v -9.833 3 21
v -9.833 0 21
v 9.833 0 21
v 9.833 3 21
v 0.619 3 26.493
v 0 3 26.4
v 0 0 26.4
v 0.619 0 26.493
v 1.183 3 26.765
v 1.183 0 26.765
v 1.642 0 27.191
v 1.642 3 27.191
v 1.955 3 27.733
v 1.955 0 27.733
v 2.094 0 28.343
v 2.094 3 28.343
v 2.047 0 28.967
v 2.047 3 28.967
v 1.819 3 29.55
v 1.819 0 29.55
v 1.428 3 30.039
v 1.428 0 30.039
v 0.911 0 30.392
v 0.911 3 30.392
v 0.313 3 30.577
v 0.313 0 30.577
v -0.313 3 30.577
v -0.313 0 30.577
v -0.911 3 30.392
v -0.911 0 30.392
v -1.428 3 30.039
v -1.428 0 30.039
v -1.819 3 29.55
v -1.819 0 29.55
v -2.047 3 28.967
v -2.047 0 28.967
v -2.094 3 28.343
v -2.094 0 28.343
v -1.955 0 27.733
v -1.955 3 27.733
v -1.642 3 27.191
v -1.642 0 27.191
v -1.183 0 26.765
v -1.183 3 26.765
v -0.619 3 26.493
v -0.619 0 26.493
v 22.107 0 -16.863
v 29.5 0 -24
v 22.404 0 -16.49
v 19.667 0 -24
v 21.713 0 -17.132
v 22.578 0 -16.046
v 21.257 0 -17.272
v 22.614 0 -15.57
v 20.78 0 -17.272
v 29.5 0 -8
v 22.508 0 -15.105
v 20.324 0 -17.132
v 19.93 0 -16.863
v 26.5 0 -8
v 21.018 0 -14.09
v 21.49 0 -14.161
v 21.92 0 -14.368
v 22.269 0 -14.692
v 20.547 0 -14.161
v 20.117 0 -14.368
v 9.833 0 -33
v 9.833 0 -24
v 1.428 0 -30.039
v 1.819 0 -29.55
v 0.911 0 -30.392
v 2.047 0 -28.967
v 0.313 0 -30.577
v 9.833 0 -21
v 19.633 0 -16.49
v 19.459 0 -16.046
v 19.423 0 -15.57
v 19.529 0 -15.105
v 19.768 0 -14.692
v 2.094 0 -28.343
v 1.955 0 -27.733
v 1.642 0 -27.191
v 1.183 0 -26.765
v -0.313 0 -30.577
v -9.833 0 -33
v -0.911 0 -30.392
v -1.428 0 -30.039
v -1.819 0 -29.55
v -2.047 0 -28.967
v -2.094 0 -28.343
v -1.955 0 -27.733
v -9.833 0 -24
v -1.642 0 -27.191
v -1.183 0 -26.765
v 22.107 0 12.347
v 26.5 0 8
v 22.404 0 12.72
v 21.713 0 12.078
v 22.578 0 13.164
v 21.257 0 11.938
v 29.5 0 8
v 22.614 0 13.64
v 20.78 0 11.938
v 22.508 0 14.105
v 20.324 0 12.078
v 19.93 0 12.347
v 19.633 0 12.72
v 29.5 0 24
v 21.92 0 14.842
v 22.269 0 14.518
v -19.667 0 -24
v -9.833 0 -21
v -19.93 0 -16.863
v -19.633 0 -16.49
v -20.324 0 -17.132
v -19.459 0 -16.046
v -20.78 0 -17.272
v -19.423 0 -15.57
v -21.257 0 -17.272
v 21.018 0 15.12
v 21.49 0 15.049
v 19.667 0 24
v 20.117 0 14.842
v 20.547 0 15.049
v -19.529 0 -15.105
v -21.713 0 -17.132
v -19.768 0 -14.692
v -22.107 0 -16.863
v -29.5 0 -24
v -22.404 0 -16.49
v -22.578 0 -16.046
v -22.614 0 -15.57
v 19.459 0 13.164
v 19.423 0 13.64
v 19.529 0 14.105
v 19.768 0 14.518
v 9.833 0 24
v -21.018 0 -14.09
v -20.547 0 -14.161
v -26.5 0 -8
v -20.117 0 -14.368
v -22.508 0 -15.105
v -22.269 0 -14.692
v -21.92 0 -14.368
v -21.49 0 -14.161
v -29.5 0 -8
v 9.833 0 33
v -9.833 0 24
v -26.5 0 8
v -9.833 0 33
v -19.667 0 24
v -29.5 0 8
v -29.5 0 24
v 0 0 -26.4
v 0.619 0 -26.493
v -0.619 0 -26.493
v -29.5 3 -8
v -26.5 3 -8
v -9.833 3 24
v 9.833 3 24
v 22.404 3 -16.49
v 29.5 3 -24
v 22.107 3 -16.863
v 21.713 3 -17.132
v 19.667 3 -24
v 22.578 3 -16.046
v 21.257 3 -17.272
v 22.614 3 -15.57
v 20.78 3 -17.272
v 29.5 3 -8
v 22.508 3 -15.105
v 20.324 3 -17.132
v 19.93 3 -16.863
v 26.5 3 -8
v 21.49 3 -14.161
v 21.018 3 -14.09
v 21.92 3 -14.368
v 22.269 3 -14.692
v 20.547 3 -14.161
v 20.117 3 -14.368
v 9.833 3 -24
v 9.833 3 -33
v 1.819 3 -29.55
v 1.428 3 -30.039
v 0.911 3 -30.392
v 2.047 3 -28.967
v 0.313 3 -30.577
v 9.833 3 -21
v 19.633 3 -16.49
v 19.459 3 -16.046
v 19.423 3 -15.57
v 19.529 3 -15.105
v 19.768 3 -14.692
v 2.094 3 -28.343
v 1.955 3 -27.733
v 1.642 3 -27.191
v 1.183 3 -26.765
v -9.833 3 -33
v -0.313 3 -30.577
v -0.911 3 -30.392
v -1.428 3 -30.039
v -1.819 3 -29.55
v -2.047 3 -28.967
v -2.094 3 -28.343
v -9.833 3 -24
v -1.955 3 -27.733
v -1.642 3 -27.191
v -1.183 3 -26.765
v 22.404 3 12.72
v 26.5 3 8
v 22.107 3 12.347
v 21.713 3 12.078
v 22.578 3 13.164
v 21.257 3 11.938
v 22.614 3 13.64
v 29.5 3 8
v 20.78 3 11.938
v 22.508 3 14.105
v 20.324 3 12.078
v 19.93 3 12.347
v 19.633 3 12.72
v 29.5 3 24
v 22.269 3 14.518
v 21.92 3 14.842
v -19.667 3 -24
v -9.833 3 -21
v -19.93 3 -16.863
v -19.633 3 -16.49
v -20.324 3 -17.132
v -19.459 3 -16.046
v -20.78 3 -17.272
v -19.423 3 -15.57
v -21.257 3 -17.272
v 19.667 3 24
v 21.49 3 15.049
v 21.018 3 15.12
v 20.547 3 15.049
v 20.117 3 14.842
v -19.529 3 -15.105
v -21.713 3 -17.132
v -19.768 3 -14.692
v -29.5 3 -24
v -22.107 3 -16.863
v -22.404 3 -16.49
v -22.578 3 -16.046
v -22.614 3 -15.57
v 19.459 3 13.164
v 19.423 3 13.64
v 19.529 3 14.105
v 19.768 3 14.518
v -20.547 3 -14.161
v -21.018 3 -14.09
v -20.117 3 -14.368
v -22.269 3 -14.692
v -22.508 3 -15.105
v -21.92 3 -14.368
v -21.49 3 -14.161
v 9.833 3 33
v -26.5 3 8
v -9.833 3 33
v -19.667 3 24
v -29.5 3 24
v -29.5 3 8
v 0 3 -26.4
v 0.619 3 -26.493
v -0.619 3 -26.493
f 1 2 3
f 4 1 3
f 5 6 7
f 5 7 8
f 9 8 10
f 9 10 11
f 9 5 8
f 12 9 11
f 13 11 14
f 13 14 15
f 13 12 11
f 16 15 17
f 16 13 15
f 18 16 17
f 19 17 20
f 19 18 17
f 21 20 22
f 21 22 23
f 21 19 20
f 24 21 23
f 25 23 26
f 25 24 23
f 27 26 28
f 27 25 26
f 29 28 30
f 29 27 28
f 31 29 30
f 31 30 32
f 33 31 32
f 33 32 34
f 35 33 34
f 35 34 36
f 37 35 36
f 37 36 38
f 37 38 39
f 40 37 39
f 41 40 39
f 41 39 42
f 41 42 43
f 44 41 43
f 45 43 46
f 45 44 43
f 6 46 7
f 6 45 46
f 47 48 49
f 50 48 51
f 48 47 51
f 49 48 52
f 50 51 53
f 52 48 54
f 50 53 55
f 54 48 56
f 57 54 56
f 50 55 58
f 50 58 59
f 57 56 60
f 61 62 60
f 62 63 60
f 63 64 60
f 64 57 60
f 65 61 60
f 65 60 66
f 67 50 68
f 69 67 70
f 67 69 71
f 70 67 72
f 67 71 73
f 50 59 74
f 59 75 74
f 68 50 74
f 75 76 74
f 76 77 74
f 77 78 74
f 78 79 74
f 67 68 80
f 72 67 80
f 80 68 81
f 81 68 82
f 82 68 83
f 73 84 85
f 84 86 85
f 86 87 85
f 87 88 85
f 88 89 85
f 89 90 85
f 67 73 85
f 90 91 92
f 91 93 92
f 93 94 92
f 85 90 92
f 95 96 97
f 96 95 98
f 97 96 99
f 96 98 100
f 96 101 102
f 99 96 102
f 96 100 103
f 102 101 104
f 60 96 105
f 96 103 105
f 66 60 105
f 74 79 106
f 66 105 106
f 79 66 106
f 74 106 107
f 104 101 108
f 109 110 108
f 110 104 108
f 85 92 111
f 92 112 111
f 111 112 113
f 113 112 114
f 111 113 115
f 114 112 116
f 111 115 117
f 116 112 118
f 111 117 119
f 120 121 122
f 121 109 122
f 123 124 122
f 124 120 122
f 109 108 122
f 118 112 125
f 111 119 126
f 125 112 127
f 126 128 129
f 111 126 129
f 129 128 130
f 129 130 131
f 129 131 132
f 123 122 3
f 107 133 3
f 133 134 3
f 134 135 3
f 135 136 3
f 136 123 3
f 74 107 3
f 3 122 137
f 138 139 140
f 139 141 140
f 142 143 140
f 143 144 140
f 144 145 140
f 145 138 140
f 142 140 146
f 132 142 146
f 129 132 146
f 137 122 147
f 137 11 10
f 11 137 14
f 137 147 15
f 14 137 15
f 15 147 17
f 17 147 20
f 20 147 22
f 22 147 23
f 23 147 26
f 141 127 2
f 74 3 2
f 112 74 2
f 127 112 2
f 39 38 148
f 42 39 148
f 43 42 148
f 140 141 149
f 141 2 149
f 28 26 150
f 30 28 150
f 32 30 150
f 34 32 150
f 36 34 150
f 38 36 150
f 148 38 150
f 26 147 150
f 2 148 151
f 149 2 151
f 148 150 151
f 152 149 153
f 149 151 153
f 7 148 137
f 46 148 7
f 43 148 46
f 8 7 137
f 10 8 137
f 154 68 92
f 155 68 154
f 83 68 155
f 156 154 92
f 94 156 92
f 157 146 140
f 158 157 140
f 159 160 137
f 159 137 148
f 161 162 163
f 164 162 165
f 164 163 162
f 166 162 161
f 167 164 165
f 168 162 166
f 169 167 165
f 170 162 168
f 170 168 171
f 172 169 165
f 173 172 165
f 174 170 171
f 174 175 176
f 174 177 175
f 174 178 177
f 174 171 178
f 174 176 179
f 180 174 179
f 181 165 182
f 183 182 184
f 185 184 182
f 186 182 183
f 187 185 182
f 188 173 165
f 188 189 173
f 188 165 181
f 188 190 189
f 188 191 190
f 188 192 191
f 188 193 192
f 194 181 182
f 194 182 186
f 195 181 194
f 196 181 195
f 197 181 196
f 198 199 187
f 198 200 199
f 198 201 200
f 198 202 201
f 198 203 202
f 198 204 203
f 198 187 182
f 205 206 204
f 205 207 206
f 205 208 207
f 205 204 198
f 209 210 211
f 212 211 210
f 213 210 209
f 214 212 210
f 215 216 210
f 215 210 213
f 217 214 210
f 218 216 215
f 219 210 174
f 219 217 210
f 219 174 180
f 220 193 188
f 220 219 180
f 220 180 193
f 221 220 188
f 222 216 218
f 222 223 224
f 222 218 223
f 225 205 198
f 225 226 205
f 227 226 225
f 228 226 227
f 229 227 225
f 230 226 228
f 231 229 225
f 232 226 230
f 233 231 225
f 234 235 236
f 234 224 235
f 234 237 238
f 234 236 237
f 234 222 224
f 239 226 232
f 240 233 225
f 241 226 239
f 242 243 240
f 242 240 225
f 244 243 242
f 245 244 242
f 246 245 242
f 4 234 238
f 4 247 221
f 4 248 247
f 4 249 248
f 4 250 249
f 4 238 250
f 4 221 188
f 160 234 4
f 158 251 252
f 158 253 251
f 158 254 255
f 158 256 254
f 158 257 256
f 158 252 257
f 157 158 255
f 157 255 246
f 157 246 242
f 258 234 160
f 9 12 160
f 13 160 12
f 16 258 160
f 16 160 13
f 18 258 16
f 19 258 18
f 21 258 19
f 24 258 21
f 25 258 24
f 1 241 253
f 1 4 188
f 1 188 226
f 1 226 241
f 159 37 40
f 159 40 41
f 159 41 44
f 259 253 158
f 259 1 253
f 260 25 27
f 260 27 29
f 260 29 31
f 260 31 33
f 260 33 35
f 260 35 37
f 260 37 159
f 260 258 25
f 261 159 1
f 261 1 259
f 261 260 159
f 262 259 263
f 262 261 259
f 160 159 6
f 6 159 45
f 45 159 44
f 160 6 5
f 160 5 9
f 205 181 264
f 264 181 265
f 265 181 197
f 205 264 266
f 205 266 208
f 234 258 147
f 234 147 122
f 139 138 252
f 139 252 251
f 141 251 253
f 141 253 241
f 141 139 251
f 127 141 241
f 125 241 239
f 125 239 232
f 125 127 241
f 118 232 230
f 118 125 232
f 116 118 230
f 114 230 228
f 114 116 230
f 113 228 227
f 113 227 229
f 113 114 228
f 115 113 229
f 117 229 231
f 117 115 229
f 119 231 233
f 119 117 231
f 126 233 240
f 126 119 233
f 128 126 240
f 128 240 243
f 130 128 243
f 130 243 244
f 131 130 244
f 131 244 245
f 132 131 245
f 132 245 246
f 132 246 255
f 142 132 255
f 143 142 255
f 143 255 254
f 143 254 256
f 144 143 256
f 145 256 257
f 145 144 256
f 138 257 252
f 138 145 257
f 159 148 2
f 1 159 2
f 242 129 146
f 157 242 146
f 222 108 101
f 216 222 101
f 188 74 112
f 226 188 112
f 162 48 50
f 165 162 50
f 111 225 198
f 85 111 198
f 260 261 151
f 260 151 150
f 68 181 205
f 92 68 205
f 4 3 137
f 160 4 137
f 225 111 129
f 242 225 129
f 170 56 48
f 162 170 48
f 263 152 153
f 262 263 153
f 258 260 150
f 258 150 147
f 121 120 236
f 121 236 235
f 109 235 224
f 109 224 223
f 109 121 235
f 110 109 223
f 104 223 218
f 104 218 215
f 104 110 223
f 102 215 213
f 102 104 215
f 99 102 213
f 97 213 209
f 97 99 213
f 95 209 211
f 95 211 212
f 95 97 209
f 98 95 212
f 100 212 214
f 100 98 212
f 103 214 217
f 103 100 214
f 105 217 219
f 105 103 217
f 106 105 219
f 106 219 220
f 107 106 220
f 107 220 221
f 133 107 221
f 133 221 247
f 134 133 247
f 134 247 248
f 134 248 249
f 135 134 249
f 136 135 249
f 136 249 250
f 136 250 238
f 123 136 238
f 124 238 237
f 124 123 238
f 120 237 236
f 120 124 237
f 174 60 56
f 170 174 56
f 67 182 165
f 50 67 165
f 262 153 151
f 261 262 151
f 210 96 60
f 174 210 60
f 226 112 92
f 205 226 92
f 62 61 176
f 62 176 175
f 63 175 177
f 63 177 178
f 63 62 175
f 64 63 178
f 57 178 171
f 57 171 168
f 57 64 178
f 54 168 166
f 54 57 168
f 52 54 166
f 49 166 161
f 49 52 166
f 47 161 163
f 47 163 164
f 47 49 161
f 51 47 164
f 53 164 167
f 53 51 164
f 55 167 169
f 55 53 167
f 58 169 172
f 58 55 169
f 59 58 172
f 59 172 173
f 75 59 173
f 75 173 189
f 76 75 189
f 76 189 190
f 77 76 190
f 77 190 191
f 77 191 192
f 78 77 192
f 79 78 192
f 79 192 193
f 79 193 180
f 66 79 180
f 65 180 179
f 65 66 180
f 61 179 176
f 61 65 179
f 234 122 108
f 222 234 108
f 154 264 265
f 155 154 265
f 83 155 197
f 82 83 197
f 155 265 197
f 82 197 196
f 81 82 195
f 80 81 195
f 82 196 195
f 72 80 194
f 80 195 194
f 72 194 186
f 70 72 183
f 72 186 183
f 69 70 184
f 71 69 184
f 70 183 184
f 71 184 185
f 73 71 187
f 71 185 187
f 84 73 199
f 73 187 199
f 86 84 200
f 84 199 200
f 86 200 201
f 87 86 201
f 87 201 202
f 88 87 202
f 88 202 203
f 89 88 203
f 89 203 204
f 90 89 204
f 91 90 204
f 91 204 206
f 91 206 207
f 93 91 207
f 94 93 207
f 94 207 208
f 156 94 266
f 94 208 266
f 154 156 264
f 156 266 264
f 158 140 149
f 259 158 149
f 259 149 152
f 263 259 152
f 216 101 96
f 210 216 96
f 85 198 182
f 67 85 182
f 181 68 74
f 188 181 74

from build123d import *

# Parameters (mm, degrees)
SKETCH1_R           = 1.6
BOSS_EXTRUDE1_DEPTH = 3
SKETCH2_R           = 2.1
BOSS_EXTRUDE2_DEPTH = 3


with BuildPart() as part:
    # Sketch1 → Boss-Extrude1 (new body)
    with BuildSketch(Plane(origin=(0, 0, 0), x_dir=(1, 0, 0), z_dir=(0, 1, 0))):
        Polygon((-29.5, 24), (-29.5, 8), (-26.5, 8), (-26.5, -8), (-29.5, -8), (-29.5, -24), (-9.833333333, -24), (-9.833333333, -21), (9.833333333, -21), (9.833333333, -24), (29.5, -24), (29.5, -8), (26.5, -8), (26.5, 8), (29.5, 8), (29.5, 24), (9.833333333, 24), (9.833333333, 21), (-9.833333333, 21), (-9.833333333, 24), align=None)
        with Locations(Location((-21.0185, 15.69, 0), (0, 0, 270))):
            Circle(SKETCH1_R, mode=Mode.SUBTRACT)
        with Locations(Location((21.0185, 15.69, 0), (0, 0, 270))):
            Circle(SKETCH1_R, mode=Mode.SUBTRACT)
        with Locations(Location((21.0185, -13.52, 0), (0, 0, 270))):
            Circle(SKETCH1_R, mode=Mode.SUBTRACT)
    extrude(amount=BOSS_EXTRUDE1_DEPTH)

    # Sketch2 → Boss-Extrude2 (add)
    with BuildSketch(Plane(origin=(0, 3, 0), x_dir=(1, 0, 0), z_dir=(0, 1, 0))):
        Polygon((-19.666666667, 24), (-9.833333333, 33), (9.833333333, 33), (19.666666667, 24), align=None)
        with Locations(Location((0, 28.5, 0), (0, 0, 270))):
            Circle(SKETCH2_R, mode=Mode.SUBTRACT)
    boss_extrude2 = extrude(amount=-BOSS_EXTRUDE2_DEPTH)

    # Mirror1: Boss-Extrude2 across plane
    add(boss_extrude2.mirror(Plane.XY))


solid = part.part
